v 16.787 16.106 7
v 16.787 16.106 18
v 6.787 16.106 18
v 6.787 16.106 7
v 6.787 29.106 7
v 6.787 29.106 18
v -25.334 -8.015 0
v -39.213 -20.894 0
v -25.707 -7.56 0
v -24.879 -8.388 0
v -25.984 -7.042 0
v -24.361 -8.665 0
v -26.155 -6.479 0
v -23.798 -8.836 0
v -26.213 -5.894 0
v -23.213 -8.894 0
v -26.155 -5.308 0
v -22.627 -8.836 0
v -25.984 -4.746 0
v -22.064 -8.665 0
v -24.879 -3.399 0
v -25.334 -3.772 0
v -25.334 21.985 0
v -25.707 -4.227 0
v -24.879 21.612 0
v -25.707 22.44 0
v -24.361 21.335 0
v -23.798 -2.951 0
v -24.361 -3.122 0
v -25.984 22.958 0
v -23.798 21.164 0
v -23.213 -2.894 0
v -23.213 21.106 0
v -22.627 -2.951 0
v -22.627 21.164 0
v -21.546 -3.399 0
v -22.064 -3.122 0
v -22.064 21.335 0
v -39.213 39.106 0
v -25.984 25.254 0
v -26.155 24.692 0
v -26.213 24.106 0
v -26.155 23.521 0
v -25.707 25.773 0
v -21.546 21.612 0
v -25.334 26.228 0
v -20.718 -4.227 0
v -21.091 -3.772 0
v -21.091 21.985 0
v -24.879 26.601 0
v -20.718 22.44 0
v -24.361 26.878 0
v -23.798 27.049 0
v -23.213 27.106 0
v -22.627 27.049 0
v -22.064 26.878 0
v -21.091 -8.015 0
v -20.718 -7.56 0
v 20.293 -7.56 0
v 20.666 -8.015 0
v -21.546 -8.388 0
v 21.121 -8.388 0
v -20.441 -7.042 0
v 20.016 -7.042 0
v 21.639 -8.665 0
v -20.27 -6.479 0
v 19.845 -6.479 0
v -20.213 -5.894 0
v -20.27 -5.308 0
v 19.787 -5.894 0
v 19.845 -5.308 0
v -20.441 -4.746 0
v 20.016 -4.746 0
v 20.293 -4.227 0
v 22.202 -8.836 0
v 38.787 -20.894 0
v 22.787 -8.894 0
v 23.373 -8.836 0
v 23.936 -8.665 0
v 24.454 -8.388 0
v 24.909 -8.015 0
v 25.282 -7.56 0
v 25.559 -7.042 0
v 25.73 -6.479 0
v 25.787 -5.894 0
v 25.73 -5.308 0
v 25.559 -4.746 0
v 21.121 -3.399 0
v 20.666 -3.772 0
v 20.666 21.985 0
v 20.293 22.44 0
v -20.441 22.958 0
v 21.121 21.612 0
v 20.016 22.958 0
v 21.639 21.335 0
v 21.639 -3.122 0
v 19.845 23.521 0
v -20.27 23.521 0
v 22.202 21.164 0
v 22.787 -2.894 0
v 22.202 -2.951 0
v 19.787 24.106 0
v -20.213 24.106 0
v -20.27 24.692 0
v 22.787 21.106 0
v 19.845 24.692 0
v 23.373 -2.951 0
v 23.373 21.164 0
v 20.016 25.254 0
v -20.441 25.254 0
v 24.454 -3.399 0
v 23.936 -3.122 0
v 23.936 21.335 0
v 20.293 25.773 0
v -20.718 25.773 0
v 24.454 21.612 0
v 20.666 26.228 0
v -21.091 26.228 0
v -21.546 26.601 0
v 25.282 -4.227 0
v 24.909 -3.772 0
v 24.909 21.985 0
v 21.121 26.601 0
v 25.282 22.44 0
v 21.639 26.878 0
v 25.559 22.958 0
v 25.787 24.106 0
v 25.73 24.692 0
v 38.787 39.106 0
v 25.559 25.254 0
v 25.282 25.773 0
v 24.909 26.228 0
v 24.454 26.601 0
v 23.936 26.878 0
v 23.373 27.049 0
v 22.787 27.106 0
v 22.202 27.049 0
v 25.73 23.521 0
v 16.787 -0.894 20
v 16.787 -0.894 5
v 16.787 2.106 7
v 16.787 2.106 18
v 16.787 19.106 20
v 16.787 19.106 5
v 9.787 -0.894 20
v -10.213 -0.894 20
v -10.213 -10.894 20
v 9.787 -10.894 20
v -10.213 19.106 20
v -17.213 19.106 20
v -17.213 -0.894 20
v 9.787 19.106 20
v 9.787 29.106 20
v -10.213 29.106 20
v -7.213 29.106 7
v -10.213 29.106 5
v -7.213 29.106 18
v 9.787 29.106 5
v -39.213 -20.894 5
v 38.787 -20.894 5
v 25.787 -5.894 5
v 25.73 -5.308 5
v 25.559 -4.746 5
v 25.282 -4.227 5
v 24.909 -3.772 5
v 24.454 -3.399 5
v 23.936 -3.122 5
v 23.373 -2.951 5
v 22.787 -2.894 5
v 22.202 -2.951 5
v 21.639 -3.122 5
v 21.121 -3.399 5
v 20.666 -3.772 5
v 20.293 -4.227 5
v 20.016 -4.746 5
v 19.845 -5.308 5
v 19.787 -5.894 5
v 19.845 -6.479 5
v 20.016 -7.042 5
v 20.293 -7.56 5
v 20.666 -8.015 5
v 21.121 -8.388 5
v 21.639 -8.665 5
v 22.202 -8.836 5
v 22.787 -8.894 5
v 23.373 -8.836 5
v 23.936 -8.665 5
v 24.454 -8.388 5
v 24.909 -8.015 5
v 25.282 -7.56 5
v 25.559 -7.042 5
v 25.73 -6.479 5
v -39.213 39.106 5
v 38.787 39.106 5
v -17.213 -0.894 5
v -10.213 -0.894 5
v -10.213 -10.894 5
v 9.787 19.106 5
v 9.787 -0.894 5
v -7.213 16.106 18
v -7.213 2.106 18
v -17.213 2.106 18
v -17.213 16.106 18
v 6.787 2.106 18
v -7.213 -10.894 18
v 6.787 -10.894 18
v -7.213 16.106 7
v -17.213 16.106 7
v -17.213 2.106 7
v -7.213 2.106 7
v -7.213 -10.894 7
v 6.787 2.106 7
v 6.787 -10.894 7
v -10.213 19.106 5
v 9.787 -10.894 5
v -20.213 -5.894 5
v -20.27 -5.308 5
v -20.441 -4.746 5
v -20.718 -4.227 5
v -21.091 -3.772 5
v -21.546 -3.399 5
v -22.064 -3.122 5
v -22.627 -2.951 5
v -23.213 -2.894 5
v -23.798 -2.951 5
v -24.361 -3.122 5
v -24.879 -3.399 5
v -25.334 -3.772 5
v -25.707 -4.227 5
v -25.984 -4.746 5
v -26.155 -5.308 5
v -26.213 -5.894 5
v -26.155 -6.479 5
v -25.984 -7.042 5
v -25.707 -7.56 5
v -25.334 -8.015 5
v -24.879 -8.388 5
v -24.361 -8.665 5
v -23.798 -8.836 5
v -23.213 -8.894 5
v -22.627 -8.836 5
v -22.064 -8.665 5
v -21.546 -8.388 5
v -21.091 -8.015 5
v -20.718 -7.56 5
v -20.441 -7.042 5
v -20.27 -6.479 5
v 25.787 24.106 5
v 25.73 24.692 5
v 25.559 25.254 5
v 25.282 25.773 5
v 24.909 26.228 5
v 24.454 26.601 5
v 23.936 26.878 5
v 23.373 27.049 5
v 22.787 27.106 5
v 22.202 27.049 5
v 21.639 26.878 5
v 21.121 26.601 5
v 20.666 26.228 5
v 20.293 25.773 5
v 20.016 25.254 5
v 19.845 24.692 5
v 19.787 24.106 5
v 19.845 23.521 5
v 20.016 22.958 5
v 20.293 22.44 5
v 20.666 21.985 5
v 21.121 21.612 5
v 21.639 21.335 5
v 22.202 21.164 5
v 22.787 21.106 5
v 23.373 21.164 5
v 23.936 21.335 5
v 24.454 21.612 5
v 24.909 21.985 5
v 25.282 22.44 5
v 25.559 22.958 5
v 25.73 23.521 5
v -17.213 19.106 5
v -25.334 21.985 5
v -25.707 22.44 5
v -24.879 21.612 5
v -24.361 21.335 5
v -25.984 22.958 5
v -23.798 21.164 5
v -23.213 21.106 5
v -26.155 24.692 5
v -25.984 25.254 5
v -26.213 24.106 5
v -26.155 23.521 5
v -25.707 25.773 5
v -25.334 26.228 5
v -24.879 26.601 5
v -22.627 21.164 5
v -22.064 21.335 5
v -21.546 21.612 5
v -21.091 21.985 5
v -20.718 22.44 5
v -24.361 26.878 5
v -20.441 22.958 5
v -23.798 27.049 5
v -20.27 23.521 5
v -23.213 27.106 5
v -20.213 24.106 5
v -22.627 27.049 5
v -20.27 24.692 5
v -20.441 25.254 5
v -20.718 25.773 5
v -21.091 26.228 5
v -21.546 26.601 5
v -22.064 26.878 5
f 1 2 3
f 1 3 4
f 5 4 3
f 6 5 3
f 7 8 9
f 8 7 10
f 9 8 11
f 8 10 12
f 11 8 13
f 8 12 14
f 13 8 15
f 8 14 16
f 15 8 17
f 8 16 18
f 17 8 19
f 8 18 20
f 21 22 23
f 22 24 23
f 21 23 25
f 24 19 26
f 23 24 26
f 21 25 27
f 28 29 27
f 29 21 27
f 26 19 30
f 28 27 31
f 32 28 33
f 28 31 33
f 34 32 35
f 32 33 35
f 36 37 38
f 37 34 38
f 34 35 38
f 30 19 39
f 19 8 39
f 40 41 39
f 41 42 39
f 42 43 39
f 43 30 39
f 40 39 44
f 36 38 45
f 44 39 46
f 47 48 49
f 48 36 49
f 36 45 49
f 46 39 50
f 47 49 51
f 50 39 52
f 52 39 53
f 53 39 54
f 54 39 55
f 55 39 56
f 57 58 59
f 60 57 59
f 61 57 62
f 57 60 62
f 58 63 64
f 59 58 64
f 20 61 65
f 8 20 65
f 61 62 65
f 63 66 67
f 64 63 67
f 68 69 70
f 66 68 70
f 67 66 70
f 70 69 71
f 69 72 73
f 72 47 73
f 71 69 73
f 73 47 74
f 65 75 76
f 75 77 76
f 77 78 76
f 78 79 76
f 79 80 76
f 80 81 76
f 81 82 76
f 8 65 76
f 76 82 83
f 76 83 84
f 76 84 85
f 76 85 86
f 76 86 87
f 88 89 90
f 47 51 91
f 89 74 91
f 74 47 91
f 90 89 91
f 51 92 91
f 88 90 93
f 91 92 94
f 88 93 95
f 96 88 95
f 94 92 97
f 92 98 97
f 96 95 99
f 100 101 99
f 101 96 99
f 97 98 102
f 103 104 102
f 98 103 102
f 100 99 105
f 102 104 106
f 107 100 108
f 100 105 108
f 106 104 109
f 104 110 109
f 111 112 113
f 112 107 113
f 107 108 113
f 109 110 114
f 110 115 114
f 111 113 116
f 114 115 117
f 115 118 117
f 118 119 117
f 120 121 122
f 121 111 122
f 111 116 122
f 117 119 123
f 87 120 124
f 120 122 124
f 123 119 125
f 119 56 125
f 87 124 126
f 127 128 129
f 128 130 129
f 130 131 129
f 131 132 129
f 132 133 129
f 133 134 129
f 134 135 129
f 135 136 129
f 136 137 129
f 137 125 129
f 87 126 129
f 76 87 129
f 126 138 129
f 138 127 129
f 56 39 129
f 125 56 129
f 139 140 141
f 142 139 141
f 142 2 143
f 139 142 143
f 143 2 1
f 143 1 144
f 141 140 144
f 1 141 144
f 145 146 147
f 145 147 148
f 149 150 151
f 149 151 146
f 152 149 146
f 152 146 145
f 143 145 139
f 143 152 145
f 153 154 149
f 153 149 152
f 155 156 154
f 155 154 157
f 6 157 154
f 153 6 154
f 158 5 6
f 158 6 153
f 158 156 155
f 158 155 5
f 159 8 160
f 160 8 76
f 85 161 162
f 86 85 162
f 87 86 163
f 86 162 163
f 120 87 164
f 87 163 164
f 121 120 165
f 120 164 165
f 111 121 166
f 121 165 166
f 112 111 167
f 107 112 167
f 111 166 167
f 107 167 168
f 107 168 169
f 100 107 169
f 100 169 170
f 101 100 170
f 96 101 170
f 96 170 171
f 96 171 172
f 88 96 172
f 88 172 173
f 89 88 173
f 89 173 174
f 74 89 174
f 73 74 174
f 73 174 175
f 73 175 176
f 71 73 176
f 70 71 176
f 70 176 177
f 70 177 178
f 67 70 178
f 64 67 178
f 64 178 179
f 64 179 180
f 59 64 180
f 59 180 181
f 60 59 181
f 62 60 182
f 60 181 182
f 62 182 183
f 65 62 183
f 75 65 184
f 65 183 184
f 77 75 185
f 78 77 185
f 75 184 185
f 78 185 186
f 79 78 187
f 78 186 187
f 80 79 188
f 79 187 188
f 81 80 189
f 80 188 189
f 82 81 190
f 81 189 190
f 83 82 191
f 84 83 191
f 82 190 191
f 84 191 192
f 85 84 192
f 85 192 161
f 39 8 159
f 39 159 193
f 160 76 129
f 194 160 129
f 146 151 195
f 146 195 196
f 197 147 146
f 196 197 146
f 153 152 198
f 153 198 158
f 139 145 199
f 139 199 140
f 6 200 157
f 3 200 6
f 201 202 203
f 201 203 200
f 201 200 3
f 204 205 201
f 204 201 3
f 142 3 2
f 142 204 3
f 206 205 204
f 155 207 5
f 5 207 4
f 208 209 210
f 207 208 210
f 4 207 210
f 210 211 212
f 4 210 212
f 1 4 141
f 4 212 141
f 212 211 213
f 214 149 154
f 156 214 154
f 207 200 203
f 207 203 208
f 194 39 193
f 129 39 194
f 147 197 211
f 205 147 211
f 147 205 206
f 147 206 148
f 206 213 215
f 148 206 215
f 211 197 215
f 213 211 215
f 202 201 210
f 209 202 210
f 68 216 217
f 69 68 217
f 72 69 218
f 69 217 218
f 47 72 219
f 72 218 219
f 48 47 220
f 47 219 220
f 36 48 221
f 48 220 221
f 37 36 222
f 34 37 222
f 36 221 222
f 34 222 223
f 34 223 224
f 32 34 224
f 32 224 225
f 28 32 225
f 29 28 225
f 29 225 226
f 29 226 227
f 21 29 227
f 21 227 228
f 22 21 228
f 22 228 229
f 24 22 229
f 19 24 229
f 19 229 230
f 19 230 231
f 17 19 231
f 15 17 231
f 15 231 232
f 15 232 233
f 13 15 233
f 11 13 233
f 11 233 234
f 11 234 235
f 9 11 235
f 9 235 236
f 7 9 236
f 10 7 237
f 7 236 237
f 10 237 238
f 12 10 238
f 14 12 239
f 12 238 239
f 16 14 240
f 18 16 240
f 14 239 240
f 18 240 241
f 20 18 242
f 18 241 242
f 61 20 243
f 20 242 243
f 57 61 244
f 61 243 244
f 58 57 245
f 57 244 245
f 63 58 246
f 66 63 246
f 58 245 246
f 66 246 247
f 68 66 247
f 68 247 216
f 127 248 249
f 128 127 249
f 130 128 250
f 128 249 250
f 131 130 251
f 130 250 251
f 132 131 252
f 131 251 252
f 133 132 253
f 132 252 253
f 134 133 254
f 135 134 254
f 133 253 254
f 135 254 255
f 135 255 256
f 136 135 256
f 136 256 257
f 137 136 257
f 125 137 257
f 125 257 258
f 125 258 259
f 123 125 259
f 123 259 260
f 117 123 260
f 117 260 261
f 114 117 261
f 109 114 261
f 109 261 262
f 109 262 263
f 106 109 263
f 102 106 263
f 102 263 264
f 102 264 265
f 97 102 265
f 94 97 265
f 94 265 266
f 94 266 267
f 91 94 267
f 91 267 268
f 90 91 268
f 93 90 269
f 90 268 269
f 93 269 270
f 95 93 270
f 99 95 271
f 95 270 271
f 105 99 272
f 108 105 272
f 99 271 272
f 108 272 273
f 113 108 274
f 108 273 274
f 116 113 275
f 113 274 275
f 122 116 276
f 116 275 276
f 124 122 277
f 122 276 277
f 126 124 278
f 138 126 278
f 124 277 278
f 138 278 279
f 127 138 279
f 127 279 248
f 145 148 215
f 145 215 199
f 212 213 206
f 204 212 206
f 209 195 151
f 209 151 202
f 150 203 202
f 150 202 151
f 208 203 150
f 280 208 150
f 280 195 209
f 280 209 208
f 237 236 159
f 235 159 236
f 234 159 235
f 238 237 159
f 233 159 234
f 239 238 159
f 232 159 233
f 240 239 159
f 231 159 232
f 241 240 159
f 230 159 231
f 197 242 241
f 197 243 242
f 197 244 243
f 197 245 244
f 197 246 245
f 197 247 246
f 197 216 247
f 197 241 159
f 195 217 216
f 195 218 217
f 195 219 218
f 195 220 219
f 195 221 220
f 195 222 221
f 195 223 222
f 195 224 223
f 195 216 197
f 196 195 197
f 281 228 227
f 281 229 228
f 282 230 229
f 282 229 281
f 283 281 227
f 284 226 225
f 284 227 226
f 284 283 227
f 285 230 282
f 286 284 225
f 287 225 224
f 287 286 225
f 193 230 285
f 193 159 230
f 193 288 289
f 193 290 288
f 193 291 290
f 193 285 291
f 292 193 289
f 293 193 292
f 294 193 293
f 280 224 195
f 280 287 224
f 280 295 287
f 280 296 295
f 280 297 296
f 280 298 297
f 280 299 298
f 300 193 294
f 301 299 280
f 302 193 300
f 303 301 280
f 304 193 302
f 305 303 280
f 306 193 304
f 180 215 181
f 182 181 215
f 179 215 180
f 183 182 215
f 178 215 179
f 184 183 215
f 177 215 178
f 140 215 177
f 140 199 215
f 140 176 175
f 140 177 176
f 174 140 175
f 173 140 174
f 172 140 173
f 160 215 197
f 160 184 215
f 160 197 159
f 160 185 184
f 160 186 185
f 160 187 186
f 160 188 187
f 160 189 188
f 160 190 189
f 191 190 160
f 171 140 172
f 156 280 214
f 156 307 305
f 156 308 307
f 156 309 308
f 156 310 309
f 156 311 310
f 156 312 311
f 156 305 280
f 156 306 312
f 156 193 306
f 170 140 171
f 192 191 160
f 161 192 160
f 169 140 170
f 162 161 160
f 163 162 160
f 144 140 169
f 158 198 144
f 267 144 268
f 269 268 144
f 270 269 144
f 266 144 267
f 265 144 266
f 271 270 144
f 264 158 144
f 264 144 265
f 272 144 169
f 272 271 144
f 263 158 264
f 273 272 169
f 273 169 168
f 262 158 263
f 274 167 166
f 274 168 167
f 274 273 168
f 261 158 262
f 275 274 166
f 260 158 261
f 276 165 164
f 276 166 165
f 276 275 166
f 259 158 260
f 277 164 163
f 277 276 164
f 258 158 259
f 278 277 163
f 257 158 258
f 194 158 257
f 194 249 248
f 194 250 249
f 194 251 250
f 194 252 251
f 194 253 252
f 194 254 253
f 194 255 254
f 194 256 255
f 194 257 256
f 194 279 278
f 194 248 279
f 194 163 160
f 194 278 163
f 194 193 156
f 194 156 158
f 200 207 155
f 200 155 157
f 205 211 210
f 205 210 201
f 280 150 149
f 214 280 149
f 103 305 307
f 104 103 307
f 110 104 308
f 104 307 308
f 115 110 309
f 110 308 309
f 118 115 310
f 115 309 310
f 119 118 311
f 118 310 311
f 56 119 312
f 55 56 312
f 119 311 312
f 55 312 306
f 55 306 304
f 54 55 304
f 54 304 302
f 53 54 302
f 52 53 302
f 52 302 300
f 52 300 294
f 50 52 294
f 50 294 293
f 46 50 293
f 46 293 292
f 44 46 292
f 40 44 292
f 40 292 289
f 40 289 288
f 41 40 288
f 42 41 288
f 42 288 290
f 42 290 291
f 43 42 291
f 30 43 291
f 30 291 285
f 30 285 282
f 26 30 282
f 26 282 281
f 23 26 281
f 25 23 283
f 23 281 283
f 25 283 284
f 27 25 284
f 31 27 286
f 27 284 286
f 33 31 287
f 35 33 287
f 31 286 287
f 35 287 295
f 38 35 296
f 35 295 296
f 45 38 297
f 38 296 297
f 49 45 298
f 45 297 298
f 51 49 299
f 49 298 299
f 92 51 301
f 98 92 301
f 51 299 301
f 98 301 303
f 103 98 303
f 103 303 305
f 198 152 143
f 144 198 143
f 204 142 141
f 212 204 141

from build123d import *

# Parameters (mm, degrees)
SKETCH1_W           = 78
SKETCH1_H           = 60
BOSS_EXTRUDE1_DEPTH = 5
SKETCH2_W           = 34
SKETCH2_H           = 40
BOSS_EXTRUDE2_DEPTH = 15
SKETCH4_W           = 7
SKETCH4_H           = 10
CUT_EXTRUDE1_DEPTH  = 15
SKETCH5_W           = 14
SKETCH5_H           = 11
CUT_EXTRUDE2_DEPTH  = 67.615484892
SKETCH6_W           = 11
SKETCH6_H           = 14
CUT_EXTRUDE3_DEPTH  = 72.170921878
SKETCH7_R           = 3
CUT_EXTRUDE4_DEPTH  = 58.375281685


with BuildPart() as part:
    # Sketch1 → Boss-Extrude1 (new body)
    with BuildSketch(Plane.XY):
        with Locations((-0.21253406, 9.10626703)):
            Rectangle(SKETCH1_W, SKETCH1_H)
    extrude(amount=BOSS_EXTRUDE1_DEPTH)

    # Sketch2 → Boss-Extrude2 (add)
    with BuildSketch(Plane.XY.offset(5)):
        with Locations((-0.21253406, 9.10626703)):
            Rectangle(SKETCH2_W, SKETCH2_H)
    extrude(amount=BOSS_EXTRUDE2_DEPTH)

    # Sketch4 → Cut-Extrude1 (cut)
    with BuildSketch(Plane.XY.offset(20)):
        with Locations((-13.71253406, 24.10626703)):
            Rectangle(SKETCH4_W, SKETCH4_H)
        with Locations((13.28746594, 24.10626703)):
            Rectangle(SKETCH4_W, SKETCH4_H)
        with Locations((13.28746594, -5.89373297)):
            Rectangle(SKETCH4_W, SKETCH4_H)
        with Locations((-13.71253406, -5.89373297)):
            Rectangle(SKETCH4_W, SKETCH4_H)
    extrude(amount=-CUT_EXTRUDE1_DEPTH, mode=Mode.SUBTRACT)

    # Sketch5 → Cut-Extrude2 (cut, through all)
    with BuildSketch(Plane.XZ.offset(10.89373297)):
        with Locations((-0.21253406, 12.5)):
            Rectangle(SKETCH5_W, SKETCH5_H)
    extrude(amount=-CUT_EXTRUDE2_DEPTH, mode=Mode.SUBTRACT)

    # Sketch6 → Cut-Extrude3 (cut, through all)
    with BuildSketch(Plane(origin=(16.78746594, 0, 0), x_dir=(0, 0, -1), z_dir=(1, 0, 0))):
        with Locations((-12.5, 9.10626703)):
            Rectangle(SKETCH6_W, SKETCH6_H)
    extrude(amount=-CUT_EXTRUDE3_DEPTH, mode=Mode.SUBTRACT)

    # Sketch7 → Cut-Extrude4 (cut, through all)
    with BuildSketch(Plane.XY.offset(5)):
        with Locations((-23.21253406, 24.10626703)):
            Circle(SKETCH7_R)
        with Locations((22.78746594, 24.10626703)):
            Circle(SKETCH7_R)
        with Locations((22.78746594, -5.89373297)):
            Circle(SKETCH7_R)
        with Locations((-23.21253406, -5.89373297)):
            Circle(SKETCH7_R)
    extrude(amount=-CUT_EXTRUDE4_DEPTH, mode=Mode.SUBTRACT)


solid = part.part
